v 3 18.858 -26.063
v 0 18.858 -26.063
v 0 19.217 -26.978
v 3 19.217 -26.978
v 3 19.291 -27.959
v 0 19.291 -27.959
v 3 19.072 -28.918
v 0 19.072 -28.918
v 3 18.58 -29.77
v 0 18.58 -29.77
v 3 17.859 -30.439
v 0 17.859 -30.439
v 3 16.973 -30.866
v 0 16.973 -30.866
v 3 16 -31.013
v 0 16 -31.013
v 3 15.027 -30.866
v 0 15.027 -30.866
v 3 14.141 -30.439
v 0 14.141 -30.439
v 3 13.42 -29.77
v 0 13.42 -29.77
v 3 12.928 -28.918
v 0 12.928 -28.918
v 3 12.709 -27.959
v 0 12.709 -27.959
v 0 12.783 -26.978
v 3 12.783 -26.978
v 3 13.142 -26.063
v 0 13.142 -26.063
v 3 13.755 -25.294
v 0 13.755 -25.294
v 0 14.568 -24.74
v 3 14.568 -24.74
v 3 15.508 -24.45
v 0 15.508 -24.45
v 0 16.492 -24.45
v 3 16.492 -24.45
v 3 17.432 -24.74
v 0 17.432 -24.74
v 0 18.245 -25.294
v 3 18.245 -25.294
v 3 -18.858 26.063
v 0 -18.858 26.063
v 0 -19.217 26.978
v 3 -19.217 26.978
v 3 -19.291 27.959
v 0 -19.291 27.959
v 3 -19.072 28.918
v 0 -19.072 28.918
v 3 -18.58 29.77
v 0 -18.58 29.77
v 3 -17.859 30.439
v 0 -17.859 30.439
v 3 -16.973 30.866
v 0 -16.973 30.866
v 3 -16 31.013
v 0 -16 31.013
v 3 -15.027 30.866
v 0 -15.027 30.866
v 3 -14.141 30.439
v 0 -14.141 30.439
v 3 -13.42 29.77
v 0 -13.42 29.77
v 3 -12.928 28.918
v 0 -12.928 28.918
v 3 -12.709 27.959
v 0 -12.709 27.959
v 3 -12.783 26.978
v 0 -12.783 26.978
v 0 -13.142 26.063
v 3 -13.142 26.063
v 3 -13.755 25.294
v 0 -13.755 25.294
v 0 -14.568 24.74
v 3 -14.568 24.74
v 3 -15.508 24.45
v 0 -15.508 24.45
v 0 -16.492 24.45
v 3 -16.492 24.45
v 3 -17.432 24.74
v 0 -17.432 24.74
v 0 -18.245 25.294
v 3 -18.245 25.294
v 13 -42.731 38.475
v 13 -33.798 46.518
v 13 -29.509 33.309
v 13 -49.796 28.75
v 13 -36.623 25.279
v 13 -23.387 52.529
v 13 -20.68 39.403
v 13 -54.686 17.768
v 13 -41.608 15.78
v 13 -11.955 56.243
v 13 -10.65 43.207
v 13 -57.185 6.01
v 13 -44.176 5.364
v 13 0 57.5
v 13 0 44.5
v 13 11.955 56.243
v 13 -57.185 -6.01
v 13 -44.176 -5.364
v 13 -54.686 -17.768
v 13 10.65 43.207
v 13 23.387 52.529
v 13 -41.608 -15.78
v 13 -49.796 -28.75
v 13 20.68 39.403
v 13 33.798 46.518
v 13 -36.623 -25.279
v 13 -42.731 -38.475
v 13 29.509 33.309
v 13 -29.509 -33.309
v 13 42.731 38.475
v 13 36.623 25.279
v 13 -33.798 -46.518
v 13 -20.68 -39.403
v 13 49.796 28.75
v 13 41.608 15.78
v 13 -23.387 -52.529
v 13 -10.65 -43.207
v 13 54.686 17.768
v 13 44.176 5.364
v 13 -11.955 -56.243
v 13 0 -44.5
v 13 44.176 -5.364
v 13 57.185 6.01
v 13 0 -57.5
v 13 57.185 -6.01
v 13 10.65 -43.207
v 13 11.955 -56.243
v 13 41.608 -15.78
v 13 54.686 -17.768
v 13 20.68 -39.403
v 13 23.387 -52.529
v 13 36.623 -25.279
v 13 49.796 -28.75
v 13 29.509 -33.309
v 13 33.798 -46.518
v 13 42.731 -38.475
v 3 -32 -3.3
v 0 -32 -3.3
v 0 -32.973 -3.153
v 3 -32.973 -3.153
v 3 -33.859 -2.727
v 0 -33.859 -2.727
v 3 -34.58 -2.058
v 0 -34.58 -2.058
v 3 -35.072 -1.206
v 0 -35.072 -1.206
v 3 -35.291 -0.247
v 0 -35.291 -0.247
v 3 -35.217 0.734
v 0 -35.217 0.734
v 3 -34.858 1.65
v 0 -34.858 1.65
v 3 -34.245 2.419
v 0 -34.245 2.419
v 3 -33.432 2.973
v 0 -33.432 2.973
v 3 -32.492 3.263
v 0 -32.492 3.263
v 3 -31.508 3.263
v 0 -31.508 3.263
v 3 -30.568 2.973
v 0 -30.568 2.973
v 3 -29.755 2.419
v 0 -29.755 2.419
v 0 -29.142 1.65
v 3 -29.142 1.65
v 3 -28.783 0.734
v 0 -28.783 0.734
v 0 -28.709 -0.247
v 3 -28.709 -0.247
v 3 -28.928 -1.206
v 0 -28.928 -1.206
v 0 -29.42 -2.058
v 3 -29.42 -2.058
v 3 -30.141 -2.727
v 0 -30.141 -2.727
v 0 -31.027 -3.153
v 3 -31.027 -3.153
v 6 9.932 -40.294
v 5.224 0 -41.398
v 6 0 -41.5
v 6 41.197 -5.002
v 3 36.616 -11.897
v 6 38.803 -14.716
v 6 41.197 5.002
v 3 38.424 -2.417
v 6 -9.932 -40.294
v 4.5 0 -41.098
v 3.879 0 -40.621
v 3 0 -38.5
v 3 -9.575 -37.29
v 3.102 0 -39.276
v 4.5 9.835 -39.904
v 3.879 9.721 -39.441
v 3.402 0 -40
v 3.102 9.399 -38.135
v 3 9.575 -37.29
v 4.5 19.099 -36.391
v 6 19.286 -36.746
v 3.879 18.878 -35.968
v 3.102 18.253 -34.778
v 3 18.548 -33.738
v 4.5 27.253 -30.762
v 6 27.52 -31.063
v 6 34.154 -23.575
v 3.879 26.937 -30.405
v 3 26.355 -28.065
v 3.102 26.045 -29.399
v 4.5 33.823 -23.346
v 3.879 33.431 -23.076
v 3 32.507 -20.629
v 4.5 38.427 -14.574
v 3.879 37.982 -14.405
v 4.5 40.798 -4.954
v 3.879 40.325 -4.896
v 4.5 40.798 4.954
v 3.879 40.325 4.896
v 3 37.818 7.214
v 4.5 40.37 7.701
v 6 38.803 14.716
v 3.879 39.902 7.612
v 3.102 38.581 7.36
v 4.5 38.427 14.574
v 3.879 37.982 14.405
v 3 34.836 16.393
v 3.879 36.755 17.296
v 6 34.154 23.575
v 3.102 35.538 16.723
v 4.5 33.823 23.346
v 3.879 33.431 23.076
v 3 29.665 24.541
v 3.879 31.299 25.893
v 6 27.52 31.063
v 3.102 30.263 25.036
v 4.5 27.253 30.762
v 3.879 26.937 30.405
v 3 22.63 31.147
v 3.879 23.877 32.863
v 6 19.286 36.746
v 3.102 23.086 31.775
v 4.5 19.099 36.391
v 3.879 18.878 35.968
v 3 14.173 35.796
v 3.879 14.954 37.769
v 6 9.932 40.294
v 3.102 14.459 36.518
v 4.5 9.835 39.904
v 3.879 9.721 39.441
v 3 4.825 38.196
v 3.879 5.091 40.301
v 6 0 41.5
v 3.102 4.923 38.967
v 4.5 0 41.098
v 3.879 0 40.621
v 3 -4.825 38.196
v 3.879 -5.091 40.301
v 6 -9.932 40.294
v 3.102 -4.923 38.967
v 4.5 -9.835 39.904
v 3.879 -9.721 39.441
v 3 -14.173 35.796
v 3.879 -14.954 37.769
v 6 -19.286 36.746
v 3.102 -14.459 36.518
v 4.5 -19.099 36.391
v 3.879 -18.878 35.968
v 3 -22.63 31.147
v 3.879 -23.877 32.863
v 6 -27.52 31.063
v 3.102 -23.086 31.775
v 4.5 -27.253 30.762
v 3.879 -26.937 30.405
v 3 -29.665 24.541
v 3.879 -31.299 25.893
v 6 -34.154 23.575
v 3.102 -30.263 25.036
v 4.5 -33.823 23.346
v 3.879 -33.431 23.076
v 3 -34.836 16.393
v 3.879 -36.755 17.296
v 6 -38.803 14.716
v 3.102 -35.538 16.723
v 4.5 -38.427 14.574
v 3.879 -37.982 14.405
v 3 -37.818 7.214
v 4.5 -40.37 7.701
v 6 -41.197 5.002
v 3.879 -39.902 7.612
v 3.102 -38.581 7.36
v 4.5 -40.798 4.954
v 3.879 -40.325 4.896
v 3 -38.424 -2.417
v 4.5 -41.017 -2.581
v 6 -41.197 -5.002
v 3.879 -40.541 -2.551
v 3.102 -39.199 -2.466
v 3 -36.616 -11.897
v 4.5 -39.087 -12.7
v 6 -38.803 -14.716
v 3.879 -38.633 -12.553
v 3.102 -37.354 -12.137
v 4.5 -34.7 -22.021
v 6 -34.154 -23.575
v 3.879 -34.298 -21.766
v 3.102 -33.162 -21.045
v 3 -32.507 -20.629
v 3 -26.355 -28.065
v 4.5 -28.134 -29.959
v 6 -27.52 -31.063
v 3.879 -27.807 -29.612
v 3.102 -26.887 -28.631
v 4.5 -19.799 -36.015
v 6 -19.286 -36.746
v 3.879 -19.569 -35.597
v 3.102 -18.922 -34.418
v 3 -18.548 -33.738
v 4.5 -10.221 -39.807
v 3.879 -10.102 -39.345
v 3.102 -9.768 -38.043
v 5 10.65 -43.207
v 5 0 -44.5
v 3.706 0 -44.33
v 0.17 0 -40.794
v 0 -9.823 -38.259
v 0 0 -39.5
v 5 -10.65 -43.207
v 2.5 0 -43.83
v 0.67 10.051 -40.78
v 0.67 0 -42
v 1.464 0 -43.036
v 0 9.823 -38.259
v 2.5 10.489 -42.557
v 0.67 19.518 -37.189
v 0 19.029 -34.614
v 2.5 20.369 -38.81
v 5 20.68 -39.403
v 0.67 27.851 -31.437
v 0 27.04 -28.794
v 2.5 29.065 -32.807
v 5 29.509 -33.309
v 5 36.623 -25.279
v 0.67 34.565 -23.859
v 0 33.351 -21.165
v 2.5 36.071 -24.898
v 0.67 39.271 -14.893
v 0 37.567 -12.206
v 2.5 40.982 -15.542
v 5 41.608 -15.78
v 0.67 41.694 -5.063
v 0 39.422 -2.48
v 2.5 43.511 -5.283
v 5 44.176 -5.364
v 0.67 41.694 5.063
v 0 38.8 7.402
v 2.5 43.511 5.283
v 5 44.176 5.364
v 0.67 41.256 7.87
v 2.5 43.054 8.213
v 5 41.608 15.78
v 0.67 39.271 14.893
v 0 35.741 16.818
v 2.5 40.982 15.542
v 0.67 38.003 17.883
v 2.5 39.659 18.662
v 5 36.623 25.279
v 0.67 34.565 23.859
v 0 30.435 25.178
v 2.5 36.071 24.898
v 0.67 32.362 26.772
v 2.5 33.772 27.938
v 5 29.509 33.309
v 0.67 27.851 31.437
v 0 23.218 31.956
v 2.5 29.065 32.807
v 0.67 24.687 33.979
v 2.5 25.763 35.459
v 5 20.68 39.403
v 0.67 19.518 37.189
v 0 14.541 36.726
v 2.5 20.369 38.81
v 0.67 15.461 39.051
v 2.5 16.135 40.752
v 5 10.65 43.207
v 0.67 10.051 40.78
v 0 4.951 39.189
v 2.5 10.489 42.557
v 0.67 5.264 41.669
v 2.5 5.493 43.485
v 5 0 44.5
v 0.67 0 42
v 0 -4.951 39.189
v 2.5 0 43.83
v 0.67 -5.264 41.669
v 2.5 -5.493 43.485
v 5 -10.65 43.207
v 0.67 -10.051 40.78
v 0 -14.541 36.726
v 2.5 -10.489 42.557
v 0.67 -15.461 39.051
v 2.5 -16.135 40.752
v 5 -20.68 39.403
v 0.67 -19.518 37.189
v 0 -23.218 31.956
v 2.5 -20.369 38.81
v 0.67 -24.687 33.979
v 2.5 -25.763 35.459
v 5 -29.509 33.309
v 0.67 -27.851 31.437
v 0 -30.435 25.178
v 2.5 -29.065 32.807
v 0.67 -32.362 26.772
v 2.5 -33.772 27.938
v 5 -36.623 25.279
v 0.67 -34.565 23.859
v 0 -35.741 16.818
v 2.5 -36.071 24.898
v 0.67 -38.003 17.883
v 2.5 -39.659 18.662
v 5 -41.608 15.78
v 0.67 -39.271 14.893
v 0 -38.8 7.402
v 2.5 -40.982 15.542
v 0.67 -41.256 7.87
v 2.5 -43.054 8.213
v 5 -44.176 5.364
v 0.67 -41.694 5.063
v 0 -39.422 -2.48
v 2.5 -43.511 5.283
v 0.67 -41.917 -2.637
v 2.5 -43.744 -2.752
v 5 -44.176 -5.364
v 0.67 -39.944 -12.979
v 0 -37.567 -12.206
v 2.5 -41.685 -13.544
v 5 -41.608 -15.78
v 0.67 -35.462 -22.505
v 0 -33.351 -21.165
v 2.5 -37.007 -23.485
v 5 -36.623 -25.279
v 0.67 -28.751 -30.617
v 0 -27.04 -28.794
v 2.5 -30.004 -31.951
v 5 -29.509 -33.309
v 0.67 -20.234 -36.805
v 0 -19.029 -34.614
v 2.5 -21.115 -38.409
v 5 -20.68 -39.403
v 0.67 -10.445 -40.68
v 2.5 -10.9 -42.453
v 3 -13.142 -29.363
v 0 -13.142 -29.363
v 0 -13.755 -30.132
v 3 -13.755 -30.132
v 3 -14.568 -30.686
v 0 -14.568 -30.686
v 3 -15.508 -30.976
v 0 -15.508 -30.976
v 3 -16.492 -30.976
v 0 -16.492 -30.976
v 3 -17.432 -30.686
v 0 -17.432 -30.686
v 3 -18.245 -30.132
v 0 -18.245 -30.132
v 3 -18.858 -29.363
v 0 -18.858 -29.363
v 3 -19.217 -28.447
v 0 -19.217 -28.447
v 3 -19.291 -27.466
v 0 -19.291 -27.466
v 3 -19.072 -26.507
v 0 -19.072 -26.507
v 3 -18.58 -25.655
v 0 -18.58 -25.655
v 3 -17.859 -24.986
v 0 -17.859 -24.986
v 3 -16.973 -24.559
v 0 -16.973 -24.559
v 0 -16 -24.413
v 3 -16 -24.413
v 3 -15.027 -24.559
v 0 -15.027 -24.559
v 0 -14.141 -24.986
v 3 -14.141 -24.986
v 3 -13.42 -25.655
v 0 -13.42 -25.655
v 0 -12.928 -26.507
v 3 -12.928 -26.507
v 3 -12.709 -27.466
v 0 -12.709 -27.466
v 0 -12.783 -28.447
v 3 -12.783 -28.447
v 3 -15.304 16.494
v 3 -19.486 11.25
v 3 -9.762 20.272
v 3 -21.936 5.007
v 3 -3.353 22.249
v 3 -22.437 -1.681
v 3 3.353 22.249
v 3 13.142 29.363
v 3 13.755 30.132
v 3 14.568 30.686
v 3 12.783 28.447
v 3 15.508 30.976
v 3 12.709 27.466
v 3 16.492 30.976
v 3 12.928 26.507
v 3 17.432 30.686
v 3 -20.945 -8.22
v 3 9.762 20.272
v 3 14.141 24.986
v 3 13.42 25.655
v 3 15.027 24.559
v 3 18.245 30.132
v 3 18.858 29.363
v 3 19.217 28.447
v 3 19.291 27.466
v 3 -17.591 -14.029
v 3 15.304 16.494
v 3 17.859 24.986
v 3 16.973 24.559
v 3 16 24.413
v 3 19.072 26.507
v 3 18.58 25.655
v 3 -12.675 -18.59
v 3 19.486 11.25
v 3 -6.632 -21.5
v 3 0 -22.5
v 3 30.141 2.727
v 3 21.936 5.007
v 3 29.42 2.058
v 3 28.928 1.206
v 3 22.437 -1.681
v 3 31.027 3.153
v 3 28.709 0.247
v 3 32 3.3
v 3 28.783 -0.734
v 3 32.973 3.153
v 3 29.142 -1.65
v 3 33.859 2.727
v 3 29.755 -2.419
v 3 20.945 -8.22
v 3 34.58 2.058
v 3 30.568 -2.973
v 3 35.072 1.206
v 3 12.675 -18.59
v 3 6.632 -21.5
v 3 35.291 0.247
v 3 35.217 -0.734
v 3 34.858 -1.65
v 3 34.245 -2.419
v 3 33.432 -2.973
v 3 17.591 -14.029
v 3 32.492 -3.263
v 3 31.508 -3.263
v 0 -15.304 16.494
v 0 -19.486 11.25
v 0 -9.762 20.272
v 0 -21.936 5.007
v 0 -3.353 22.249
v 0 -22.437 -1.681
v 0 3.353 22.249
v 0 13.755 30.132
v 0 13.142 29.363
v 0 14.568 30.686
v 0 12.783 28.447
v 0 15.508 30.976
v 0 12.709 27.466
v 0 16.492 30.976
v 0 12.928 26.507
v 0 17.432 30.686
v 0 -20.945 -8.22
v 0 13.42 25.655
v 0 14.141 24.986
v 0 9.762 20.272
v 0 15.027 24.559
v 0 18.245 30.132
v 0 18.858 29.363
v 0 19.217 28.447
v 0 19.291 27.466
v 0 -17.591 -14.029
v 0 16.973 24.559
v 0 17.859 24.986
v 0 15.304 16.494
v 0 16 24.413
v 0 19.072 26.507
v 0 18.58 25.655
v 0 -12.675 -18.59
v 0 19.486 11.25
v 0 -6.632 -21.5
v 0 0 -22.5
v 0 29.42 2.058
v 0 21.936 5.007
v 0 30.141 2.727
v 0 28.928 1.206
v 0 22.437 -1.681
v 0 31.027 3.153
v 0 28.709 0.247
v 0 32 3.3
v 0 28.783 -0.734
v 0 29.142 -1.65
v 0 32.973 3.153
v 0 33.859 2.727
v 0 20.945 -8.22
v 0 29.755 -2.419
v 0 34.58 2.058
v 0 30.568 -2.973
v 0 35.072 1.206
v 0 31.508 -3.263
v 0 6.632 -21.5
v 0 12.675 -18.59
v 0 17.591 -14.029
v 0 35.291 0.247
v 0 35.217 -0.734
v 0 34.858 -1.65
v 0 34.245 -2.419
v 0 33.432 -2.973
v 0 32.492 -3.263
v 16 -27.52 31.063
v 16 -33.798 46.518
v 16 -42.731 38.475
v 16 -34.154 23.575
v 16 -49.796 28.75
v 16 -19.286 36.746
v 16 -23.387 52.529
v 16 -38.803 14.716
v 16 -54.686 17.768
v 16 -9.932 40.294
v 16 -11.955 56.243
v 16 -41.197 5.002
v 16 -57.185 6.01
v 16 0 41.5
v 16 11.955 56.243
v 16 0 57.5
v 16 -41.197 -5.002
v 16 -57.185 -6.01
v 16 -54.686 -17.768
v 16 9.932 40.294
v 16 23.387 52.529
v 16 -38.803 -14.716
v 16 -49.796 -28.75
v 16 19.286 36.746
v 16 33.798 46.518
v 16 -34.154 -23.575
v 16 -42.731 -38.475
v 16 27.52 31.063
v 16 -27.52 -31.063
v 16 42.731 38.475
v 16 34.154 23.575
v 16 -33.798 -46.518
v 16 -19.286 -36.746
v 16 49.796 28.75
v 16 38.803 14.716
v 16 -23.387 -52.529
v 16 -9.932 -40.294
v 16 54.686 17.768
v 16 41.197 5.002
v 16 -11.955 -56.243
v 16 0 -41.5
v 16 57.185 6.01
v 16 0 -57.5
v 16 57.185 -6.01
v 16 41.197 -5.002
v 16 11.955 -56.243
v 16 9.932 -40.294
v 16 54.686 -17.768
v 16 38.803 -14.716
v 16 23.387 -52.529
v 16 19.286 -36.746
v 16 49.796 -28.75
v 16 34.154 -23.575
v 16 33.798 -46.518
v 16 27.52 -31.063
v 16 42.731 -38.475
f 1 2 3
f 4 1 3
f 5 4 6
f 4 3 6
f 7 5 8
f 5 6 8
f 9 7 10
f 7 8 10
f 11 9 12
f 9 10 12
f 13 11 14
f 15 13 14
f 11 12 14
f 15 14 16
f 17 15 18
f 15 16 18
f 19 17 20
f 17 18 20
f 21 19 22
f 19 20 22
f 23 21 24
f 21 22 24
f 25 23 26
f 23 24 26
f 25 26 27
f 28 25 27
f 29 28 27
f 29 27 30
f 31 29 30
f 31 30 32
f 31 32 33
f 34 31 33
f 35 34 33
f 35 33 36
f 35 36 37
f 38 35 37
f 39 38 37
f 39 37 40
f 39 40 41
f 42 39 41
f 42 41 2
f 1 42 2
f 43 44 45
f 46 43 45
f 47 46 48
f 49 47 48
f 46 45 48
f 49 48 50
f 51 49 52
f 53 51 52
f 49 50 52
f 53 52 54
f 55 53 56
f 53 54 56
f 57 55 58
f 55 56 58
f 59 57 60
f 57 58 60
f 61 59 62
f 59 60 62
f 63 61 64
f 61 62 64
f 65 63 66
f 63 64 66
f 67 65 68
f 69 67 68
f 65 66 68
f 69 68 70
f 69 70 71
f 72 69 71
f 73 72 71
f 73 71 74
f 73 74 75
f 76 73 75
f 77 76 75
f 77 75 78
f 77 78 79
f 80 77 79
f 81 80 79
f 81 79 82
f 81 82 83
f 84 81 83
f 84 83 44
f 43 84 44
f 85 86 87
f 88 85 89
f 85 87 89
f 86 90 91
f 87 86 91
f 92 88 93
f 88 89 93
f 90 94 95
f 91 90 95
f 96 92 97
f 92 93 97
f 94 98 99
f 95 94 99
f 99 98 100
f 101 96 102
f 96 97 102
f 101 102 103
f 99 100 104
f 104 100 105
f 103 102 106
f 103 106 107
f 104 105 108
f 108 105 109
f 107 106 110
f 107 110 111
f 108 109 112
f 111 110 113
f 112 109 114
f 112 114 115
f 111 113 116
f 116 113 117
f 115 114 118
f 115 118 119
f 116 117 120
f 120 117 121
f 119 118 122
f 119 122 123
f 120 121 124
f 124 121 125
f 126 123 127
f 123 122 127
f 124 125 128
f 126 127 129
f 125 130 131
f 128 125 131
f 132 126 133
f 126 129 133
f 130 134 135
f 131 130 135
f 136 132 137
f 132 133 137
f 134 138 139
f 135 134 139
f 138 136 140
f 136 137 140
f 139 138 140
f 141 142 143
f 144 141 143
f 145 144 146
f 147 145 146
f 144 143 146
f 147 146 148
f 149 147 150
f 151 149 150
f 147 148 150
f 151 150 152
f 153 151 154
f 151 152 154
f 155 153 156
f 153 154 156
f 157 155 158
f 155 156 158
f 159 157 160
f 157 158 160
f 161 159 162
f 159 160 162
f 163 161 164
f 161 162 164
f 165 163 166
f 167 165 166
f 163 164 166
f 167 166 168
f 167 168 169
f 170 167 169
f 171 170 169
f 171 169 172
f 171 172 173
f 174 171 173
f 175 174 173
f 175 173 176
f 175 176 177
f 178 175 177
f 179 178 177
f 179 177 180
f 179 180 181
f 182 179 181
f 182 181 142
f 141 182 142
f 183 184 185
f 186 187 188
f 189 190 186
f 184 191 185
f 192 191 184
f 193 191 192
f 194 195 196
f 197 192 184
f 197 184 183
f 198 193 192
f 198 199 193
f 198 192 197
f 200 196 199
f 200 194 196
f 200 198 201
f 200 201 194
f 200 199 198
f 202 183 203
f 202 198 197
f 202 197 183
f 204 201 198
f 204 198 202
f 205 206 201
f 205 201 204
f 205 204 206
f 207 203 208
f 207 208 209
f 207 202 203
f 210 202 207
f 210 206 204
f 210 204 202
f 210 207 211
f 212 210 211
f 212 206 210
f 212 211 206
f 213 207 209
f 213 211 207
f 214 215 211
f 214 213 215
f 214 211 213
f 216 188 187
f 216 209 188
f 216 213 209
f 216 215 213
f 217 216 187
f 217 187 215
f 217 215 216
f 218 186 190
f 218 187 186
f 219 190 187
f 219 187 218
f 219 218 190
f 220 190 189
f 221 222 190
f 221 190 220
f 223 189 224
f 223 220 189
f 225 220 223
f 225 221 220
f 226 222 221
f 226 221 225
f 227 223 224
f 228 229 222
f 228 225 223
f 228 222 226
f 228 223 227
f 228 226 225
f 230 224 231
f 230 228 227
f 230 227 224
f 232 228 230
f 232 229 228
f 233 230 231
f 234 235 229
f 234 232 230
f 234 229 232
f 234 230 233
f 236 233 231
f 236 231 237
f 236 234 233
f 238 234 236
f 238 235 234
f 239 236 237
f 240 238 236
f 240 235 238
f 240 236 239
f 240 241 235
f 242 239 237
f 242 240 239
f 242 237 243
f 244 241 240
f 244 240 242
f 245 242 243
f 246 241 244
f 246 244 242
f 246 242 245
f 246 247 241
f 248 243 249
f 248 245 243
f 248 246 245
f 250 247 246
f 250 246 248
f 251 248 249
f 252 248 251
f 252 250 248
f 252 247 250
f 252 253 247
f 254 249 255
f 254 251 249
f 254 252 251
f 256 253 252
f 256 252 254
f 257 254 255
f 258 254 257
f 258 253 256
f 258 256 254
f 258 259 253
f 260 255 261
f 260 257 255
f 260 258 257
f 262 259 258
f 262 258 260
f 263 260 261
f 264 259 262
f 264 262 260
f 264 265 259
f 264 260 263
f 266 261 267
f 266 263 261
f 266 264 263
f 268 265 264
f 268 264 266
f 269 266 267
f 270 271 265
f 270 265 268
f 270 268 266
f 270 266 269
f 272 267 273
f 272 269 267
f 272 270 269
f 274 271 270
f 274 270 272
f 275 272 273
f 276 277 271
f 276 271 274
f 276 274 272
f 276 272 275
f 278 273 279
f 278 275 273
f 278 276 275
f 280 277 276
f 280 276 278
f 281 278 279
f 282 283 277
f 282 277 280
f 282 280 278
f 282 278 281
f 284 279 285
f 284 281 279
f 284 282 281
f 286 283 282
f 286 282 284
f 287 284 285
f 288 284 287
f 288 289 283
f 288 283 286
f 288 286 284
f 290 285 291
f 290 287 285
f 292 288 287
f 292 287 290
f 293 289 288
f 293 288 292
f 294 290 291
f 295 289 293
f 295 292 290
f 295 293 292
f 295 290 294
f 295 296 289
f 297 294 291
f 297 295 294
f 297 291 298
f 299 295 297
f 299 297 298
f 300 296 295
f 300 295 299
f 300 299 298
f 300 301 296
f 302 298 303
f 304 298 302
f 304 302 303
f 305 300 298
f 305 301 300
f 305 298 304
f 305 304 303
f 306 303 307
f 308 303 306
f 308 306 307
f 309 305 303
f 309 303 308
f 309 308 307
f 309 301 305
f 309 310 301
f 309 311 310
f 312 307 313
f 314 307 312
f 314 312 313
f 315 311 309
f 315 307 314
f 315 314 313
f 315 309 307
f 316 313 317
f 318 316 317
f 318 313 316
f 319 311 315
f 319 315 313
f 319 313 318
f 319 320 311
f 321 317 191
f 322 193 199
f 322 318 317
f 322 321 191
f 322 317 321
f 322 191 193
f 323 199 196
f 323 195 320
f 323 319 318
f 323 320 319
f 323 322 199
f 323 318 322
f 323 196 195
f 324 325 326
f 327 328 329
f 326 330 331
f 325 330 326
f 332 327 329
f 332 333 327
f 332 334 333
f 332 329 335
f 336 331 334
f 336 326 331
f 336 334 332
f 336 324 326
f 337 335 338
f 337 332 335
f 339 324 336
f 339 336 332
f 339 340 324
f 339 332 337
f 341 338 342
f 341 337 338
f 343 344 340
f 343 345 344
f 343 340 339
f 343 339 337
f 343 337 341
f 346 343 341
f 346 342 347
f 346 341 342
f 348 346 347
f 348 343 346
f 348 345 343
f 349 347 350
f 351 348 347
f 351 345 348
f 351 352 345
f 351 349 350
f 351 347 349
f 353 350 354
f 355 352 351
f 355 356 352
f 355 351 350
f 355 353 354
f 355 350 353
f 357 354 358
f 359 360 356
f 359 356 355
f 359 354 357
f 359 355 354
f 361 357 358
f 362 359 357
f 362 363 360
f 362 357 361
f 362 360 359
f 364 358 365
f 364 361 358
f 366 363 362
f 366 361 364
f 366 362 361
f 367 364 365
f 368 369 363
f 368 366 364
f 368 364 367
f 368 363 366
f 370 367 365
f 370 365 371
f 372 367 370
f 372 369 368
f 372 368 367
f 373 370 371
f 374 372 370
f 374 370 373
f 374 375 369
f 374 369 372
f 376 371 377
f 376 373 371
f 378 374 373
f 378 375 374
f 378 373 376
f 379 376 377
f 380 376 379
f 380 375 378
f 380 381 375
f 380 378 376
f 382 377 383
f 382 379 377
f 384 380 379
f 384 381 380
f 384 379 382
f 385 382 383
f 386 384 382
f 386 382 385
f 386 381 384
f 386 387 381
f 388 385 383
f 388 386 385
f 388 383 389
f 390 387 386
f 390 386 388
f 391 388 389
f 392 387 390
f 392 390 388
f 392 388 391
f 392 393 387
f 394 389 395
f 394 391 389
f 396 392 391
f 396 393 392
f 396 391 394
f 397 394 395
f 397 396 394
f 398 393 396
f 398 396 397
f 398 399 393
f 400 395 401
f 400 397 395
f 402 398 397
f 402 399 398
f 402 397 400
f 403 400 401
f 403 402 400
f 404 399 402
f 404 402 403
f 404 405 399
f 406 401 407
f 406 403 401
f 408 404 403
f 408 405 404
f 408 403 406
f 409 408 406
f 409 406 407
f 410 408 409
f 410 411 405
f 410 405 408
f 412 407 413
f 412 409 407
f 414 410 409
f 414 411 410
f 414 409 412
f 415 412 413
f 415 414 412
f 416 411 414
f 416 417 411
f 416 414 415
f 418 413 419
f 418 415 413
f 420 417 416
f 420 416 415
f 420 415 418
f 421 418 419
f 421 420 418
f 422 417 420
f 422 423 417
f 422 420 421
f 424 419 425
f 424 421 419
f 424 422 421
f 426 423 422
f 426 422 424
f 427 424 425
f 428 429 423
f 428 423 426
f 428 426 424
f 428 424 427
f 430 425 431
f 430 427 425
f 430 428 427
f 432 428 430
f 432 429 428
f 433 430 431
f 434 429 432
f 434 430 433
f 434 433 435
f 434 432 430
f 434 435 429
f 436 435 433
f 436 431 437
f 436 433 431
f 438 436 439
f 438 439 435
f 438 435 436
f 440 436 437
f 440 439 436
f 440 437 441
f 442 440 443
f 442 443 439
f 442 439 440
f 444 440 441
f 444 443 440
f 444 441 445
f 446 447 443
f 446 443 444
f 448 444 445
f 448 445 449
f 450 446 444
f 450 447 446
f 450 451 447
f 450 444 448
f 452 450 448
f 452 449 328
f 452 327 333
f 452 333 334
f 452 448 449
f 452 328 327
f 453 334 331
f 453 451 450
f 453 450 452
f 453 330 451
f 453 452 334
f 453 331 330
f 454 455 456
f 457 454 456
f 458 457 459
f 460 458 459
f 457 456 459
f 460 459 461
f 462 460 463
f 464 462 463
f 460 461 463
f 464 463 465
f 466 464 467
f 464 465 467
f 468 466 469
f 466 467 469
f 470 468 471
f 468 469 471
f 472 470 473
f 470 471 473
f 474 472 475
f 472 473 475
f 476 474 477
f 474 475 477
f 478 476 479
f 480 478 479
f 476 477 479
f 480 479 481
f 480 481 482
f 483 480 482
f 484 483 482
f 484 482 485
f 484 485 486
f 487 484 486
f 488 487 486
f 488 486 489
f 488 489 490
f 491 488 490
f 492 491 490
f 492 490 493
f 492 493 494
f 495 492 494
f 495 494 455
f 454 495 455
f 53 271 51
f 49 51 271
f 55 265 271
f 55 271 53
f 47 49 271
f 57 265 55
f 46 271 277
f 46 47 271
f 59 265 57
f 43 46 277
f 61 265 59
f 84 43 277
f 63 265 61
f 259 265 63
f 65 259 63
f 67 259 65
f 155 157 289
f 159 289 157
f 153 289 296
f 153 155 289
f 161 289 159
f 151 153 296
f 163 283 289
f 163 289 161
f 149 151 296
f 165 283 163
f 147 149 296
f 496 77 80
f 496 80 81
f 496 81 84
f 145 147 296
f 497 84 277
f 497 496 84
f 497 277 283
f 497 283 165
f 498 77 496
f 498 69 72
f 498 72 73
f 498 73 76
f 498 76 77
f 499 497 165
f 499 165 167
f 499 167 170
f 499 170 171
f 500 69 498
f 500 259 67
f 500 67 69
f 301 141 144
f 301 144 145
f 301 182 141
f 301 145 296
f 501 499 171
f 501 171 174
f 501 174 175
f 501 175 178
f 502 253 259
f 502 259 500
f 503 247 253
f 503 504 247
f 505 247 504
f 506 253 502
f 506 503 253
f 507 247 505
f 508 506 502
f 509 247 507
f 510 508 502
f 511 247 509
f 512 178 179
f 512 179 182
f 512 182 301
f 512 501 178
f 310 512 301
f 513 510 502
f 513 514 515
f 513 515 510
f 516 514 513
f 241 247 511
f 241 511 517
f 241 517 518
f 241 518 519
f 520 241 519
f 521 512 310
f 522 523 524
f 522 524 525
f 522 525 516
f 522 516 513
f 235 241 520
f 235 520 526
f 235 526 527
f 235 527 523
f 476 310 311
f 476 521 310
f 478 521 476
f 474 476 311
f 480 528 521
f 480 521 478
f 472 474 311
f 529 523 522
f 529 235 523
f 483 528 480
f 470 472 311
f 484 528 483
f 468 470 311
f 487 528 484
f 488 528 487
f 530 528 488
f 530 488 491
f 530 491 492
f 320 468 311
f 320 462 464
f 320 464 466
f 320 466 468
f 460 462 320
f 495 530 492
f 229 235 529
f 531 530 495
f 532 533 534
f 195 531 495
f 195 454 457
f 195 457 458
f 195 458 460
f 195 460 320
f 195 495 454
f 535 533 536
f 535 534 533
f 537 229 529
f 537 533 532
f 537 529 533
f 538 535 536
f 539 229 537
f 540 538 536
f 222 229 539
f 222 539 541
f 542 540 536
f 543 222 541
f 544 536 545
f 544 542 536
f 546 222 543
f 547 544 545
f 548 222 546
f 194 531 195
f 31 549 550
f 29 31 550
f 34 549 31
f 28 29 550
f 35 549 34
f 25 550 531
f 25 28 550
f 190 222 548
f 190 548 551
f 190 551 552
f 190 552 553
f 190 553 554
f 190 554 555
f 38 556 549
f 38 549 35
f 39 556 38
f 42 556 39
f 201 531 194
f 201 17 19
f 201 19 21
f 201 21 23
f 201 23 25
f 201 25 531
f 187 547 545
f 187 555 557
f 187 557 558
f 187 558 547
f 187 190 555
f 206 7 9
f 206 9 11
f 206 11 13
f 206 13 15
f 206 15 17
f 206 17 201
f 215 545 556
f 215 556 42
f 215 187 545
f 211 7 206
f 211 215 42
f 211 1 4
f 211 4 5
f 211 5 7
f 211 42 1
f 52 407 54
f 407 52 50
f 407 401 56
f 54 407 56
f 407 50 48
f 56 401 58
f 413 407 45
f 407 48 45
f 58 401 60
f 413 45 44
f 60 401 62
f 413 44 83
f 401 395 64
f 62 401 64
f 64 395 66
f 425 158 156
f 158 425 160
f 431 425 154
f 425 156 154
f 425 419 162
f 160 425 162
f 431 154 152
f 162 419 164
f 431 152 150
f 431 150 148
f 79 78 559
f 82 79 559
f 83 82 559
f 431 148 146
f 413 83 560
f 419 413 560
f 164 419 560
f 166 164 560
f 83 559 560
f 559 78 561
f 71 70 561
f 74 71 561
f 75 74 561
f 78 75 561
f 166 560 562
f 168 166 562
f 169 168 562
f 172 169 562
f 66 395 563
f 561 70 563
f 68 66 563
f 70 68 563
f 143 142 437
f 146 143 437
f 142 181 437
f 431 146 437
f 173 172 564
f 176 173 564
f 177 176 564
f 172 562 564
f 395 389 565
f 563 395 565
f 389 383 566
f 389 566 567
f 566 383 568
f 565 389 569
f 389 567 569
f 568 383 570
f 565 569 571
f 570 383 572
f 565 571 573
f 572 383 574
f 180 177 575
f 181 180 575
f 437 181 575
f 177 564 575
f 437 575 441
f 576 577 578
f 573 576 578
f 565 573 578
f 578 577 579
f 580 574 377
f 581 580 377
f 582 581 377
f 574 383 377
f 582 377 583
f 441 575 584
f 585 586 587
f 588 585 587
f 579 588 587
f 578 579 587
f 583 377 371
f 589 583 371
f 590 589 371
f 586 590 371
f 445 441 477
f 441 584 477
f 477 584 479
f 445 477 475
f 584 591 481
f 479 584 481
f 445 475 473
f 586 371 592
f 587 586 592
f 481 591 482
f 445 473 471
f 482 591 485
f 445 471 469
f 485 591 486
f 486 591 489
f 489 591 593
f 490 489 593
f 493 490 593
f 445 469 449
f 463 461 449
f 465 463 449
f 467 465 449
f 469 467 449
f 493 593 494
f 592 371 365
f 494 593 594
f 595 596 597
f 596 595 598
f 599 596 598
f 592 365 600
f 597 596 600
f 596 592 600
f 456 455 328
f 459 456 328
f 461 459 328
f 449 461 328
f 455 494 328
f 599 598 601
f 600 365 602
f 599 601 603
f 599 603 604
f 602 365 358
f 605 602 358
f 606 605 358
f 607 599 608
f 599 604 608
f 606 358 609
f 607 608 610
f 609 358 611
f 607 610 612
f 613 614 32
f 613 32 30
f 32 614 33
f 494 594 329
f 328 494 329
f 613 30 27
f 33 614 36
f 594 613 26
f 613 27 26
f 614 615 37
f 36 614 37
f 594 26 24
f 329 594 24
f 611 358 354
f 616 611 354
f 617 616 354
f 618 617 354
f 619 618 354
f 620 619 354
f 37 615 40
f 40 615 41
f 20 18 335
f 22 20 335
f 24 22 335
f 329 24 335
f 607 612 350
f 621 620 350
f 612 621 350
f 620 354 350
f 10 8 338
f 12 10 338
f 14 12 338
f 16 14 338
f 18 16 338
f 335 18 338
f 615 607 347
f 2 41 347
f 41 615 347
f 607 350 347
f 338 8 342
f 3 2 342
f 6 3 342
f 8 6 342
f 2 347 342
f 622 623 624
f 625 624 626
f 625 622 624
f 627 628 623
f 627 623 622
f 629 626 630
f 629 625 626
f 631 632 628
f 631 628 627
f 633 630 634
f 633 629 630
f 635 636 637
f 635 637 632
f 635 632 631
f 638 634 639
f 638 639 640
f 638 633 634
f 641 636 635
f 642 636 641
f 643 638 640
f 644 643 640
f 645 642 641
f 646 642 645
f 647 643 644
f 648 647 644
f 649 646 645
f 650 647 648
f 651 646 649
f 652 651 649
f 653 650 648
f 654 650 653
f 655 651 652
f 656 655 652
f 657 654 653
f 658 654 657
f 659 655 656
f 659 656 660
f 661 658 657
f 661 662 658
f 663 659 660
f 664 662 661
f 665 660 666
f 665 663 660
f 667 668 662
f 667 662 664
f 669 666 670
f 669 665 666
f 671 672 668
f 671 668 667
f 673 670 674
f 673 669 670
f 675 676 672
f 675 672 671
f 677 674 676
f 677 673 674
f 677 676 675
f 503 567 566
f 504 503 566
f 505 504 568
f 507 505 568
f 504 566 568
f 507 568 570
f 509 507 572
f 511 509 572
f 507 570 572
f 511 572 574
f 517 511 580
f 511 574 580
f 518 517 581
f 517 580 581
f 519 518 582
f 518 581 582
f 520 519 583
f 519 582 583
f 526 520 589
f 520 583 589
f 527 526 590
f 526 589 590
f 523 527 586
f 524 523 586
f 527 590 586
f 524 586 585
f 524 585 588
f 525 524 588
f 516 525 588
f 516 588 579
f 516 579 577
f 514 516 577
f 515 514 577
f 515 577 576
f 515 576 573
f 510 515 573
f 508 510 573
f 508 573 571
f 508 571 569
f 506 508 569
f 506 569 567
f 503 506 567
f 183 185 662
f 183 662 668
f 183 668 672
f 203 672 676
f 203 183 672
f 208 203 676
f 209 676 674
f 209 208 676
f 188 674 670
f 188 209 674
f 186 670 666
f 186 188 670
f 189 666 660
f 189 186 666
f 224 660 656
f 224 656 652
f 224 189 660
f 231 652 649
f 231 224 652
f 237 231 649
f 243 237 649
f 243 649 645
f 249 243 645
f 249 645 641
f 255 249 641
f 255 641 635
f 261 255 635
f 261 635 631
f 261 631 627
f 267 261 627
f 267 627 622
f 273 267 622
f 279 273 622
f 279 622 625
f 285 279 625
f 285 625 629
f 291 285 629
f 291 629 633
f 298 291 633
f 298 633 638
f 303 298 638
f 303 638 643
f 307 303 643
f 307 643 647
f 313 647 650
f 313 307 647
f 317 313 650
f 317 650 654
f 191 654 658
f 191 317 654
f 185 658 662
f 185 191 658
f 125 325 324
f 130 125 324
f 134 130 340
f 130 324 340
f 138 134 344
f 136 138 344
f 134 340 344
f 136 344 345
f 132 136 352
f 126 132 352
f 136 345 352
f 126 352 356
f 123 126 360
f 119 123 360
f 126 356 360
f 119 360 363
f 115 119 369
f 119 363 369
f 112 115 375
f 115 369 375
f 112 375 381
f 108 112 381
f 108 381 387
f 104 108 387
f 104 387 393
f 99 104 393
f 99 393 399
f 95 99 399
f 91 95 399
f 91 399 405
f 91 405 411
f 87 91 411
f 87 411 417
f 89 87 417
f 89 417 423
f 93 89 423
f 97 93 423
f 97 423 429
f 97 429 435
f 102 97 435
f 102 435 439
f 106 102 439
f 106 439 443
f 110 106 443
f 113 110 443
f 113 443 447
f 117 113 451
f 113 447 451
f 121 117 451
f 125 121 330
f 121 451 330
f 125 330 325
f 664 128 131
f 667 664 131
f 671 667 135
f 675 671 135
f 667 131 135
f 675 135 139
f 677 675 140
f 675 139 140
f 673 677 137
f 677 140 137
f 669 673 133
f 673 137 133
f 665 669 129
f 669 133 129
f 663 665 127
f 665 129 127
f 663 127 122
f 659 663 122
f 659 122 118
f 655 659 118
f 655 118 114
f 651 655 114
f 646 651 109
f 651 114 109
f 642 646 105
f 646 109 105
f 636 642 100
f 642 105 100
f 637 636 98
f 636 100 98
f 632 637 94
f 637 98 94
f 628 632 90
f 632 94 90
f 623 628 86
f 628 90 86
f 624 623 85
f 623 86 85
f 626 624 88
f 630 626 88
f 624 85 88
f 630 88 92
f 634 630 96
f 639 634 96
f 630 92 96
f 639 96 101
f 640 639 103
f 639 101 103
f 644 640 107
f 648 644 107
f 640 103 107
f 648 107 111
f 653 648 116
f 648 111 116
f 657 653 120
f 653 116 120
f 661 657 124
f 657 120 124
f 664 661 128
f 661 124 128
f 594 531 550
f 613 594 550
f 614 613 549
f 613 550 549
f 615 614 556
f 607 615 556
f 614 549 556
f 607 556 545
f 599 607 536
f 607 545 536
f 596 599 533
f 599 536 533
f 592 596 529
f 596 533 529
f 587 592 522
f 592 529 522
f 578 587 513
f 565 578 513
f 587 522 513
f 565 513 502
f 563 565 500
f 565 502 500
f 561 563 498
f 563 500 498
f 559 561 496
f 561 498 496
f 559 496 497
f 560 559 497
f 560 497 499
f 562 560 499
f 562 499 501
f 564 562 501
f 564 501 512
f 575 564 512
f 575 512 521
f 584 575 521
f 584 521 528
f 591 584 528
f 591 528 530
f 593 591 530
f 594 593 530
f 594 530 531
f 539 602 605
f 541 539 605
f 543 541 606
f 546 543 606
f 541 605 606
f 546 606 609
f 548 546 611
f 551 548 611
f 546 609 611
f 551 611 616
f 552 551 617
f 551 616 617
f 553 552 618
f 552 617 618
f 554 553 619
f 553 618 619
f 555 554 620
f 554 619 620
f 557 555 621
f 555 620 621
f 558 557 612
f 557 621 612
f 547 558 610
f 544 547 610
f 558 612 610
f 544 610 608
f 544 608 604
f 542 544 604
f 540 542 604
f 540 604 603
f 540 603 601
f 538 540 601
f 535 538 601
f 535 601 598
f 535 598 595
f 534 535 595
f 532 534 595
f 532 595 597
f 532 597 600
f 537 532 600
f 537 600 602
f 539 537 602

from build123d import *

# Parameters (mm, degrees)
SKETCH1_R             = 44.5
BOSS_EXTRUDE2_DEPTH   = 3
SKETCH3_R             = 44.5
SKETCH3_R_2           = 41.5
BOSS_EXTRUDE3_DEPTH   = 10
SKETCH4_R             = 57.5
SKETCH4_R_2           = 41.5
BOSS_EXTRUDE4_DEPTH   = 3
SKETCH5_R             = 22.5
CUT_EXTRUDE1_DEPTH    = 83.349863388
FILLET1_R             = 3
FILLET2_R             = 5
F_1_0MM_DOWEL_HOLE2_D = 6.6
CIRPATTERN2_COUNT     = 6


with BuildPart() as part:
    # Sketch1 → Boss-Extrude2 (new body)
    with BuildSketch(Plane(origin=(0, 0, 0), x_dir=(0, 0, -1), z_dir=(1, 0, 0))):
        Circle(SKETCH1_R)
    extrude(amount=BOSS_EXTRUDE2_DEPTH)

    # Sketch3 → Boss-Extrude3 (add)
    with BuildSketch(Plane(origin=(3, 0, 0), x_dir=(0, 0, -1), z_dir=(1, 0, 0))):
        Circle(SKETCH3_R)
        Circle(SKETCH3_R_2, mode=Mode.SUBTRACT)
    extrude(amount=BOSS_EXTRUDE3_DEPTH)

    # Sketch4 → Boss-Extrude4 (add)
    with BuildSketch(Plane(origin=(13, 0, 0), x_dir=(0, 0, -1), z_dir=(1, 0, 0))):
        Circle(SKETCH4_R)
        Circle(SKETCH4_R_2, mode=Mode.SUBTRACT)
    extrude(amount=BOSS_EXTRUDE4_DEPTH)

    # Sketch5 → Cut-Extrude1 (cut, through all)
    with BuildSketch(Plane(origin=(3, 0, 0), x_dir=(0, 0, -1), z_dir=(1, 0, 0))):
        Circle(SKETCH5_R)
    extrude(amount=-CUT_EXTRUDE1_DEPTH, mode=Mode.SUBTRACT)

    # Fillet1
    fillet1_edges = [part.edges().sort_by_distance(p)[0] for p in [
        (3, 0, 41.5),
    ]]
    fillet(fillet1_edges, radius=FILLET1_R)

    # Fillet2
    fillet2_edges = [part.edges().sort_by_distance(p)[0] for p in [
        (0, 0, 44.5),
    ]]
    fillet(fillet2_edges, radius=FILLET2_R)

    # Ø1.0mm Dowel Hole2 (through all)
    with Locations(Plane(origin=(3, 0, 0), x_dir=(0, 0, -1), z_dir=(1, 0, 0))):
        with Locations((0, 32)):
            f_1_0mm_dowel_hole2 = Hole(F_1_0MM_DOWEL_HOLE2_D / 2)

    # CirPattern2: Ø1.0mm Dowel Hole2 ×6 about axis
    cirpattern2_axis = Axis((0, 0, 0), (1, 0, 0))
    for i in range(1, CIRPATTERN2_COUNT):
        add(f_1_0mm_dowel_hole2.rotate(cirpattern2_axis, i * 360 / CIRPATTERN2_COUNT), mode=Mode.SUBTRACT)


solid = part.part
